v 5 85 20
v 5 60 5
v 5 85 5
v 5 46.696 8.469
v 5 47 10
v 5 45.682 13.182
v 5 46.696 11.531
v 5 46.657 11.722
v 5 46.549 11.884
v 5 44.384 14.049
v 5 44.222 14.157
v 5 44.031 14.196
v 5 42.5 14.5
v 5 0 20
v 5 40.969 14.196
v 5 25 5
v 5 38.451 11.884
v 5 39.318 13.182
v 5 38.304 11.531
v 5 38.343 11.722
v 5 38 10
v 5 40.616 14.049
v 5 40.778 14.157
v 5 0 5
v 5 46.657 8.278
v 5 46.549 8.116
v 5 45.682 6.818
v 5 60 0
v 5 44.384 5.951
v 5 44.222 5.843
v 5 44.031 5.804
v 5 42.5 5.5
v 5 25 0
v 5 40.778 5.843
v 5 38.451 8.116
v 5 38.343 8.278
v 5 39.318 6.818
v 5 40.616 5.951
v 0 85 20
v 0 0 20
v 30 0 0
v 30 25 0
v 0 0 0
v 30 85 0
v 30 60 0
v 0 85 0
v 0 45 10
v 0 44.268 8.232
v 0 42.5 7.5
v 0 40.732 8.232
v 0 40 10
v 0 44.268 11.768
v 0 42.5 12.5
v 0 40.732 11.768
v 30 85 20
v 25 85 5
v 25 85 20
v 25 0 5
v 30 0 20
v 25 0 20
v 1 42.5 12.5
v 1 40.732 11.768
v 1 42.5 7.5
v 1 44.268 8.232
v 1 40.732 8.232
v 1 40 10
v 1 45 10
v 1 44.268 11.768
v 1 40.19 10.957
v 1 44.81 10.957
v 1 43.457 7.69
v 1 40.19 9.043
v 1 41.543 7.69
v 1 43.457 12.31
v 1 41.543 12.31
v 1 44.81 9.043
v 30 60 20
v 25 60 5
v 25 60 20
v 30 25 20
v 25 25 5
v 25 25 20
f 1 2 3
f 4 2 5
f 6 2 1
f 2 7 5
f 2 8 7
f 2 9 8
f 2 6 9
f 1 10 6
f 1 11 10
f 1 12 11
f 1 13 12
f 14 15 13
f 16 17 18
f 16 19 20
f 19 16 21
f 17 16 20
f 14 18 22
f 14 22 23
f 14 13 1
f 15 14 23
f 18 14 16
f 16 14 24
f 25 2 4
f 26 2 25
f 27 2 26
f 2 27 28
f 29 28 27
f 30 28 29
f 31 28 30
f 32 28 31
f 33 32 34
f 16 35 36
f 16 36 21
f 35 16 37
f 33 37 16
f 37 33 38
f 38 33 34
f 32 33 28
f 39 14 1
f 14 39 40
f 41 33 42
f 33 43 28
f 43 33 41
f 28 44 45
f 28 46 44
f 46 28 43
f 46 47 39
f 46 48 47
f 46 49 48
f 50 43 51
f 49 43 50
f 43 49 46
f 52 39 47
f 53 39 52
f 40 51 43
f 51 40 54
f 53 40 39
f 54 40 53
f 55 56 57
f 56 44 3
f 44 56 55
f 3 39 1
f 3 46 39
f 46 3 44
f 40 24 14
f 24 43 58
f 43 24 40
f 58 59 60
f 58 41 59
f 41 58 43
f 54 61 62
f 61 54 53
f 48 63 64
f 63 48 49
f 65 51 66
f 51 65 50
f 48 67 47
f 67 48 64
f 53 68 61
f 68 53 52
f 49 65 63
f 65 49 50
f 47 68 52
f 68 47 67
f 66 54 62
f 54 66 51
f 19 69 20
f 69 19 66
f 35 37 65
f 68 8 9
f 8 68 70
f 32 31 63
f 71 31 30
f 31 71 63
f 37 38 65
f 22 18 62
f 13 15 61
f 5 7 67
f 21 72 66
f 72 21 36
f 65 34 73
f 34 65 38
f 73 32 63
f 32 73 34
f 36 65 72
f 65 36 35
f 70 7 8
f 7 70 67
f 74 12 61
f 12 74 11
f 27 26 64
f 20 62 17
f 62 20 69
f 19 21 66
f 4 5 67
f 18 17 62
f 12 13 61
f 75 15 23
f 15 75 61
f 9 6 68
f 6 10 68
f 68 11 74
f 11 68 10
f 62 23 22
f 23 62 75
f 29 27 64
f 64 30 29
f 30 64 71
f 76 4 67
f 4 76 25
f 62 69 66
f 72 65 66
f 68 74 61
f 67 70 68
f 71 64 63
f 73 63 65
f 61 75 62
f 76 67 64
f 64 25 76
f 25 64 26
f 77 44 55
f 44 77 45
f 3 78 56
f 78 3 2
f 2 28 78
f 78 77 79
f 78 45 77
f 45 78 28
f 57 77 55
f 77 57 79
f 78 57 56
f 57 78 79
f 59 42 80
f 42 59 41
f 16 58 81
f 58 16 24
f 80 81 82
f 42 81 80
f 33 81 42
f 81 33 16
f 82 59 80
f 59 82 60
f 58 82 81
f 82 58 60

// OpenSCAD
width_between = 35;

thickness = 5;
height = 20;
width_holder = 25;
length_holder = 20;
height_holder = 20;

screw_head_diameter = 10;
screw_body_diameter = 5;
screw_head_height = 4;

difference() {
    cube([thickness, 2 * width_holder + width_between, height]);
    translate([0, (2 * width_holder + width_between) / 2, height / 2]) rotate([0, 90, 0]) cylinder(r=screw_body_diameter/2, thickness);
    translate([thickness-screw_head_height, (2 * width_holder + width_between) / 2, height / 2]) rotate([0, 90, 0]) cylinder(r1=screw_body_diameter/2, r2=screw_head_diameter/2, thickness);
}

// Left
cube([2 * thickness + length_holder, width_holder, thickness]);
translate([thickness + length_holder, 0, 0]) cube([thickness, width_holder, height_holder]);

// Right
translate([0, width_holder + width_between, 0]) {
    cube([2 * thickness + length_holder, width_holder, thickness]);
    translate([thickness + length_holder, 0, 0]) cube([thickness, width_holder, height_holder]);
}
